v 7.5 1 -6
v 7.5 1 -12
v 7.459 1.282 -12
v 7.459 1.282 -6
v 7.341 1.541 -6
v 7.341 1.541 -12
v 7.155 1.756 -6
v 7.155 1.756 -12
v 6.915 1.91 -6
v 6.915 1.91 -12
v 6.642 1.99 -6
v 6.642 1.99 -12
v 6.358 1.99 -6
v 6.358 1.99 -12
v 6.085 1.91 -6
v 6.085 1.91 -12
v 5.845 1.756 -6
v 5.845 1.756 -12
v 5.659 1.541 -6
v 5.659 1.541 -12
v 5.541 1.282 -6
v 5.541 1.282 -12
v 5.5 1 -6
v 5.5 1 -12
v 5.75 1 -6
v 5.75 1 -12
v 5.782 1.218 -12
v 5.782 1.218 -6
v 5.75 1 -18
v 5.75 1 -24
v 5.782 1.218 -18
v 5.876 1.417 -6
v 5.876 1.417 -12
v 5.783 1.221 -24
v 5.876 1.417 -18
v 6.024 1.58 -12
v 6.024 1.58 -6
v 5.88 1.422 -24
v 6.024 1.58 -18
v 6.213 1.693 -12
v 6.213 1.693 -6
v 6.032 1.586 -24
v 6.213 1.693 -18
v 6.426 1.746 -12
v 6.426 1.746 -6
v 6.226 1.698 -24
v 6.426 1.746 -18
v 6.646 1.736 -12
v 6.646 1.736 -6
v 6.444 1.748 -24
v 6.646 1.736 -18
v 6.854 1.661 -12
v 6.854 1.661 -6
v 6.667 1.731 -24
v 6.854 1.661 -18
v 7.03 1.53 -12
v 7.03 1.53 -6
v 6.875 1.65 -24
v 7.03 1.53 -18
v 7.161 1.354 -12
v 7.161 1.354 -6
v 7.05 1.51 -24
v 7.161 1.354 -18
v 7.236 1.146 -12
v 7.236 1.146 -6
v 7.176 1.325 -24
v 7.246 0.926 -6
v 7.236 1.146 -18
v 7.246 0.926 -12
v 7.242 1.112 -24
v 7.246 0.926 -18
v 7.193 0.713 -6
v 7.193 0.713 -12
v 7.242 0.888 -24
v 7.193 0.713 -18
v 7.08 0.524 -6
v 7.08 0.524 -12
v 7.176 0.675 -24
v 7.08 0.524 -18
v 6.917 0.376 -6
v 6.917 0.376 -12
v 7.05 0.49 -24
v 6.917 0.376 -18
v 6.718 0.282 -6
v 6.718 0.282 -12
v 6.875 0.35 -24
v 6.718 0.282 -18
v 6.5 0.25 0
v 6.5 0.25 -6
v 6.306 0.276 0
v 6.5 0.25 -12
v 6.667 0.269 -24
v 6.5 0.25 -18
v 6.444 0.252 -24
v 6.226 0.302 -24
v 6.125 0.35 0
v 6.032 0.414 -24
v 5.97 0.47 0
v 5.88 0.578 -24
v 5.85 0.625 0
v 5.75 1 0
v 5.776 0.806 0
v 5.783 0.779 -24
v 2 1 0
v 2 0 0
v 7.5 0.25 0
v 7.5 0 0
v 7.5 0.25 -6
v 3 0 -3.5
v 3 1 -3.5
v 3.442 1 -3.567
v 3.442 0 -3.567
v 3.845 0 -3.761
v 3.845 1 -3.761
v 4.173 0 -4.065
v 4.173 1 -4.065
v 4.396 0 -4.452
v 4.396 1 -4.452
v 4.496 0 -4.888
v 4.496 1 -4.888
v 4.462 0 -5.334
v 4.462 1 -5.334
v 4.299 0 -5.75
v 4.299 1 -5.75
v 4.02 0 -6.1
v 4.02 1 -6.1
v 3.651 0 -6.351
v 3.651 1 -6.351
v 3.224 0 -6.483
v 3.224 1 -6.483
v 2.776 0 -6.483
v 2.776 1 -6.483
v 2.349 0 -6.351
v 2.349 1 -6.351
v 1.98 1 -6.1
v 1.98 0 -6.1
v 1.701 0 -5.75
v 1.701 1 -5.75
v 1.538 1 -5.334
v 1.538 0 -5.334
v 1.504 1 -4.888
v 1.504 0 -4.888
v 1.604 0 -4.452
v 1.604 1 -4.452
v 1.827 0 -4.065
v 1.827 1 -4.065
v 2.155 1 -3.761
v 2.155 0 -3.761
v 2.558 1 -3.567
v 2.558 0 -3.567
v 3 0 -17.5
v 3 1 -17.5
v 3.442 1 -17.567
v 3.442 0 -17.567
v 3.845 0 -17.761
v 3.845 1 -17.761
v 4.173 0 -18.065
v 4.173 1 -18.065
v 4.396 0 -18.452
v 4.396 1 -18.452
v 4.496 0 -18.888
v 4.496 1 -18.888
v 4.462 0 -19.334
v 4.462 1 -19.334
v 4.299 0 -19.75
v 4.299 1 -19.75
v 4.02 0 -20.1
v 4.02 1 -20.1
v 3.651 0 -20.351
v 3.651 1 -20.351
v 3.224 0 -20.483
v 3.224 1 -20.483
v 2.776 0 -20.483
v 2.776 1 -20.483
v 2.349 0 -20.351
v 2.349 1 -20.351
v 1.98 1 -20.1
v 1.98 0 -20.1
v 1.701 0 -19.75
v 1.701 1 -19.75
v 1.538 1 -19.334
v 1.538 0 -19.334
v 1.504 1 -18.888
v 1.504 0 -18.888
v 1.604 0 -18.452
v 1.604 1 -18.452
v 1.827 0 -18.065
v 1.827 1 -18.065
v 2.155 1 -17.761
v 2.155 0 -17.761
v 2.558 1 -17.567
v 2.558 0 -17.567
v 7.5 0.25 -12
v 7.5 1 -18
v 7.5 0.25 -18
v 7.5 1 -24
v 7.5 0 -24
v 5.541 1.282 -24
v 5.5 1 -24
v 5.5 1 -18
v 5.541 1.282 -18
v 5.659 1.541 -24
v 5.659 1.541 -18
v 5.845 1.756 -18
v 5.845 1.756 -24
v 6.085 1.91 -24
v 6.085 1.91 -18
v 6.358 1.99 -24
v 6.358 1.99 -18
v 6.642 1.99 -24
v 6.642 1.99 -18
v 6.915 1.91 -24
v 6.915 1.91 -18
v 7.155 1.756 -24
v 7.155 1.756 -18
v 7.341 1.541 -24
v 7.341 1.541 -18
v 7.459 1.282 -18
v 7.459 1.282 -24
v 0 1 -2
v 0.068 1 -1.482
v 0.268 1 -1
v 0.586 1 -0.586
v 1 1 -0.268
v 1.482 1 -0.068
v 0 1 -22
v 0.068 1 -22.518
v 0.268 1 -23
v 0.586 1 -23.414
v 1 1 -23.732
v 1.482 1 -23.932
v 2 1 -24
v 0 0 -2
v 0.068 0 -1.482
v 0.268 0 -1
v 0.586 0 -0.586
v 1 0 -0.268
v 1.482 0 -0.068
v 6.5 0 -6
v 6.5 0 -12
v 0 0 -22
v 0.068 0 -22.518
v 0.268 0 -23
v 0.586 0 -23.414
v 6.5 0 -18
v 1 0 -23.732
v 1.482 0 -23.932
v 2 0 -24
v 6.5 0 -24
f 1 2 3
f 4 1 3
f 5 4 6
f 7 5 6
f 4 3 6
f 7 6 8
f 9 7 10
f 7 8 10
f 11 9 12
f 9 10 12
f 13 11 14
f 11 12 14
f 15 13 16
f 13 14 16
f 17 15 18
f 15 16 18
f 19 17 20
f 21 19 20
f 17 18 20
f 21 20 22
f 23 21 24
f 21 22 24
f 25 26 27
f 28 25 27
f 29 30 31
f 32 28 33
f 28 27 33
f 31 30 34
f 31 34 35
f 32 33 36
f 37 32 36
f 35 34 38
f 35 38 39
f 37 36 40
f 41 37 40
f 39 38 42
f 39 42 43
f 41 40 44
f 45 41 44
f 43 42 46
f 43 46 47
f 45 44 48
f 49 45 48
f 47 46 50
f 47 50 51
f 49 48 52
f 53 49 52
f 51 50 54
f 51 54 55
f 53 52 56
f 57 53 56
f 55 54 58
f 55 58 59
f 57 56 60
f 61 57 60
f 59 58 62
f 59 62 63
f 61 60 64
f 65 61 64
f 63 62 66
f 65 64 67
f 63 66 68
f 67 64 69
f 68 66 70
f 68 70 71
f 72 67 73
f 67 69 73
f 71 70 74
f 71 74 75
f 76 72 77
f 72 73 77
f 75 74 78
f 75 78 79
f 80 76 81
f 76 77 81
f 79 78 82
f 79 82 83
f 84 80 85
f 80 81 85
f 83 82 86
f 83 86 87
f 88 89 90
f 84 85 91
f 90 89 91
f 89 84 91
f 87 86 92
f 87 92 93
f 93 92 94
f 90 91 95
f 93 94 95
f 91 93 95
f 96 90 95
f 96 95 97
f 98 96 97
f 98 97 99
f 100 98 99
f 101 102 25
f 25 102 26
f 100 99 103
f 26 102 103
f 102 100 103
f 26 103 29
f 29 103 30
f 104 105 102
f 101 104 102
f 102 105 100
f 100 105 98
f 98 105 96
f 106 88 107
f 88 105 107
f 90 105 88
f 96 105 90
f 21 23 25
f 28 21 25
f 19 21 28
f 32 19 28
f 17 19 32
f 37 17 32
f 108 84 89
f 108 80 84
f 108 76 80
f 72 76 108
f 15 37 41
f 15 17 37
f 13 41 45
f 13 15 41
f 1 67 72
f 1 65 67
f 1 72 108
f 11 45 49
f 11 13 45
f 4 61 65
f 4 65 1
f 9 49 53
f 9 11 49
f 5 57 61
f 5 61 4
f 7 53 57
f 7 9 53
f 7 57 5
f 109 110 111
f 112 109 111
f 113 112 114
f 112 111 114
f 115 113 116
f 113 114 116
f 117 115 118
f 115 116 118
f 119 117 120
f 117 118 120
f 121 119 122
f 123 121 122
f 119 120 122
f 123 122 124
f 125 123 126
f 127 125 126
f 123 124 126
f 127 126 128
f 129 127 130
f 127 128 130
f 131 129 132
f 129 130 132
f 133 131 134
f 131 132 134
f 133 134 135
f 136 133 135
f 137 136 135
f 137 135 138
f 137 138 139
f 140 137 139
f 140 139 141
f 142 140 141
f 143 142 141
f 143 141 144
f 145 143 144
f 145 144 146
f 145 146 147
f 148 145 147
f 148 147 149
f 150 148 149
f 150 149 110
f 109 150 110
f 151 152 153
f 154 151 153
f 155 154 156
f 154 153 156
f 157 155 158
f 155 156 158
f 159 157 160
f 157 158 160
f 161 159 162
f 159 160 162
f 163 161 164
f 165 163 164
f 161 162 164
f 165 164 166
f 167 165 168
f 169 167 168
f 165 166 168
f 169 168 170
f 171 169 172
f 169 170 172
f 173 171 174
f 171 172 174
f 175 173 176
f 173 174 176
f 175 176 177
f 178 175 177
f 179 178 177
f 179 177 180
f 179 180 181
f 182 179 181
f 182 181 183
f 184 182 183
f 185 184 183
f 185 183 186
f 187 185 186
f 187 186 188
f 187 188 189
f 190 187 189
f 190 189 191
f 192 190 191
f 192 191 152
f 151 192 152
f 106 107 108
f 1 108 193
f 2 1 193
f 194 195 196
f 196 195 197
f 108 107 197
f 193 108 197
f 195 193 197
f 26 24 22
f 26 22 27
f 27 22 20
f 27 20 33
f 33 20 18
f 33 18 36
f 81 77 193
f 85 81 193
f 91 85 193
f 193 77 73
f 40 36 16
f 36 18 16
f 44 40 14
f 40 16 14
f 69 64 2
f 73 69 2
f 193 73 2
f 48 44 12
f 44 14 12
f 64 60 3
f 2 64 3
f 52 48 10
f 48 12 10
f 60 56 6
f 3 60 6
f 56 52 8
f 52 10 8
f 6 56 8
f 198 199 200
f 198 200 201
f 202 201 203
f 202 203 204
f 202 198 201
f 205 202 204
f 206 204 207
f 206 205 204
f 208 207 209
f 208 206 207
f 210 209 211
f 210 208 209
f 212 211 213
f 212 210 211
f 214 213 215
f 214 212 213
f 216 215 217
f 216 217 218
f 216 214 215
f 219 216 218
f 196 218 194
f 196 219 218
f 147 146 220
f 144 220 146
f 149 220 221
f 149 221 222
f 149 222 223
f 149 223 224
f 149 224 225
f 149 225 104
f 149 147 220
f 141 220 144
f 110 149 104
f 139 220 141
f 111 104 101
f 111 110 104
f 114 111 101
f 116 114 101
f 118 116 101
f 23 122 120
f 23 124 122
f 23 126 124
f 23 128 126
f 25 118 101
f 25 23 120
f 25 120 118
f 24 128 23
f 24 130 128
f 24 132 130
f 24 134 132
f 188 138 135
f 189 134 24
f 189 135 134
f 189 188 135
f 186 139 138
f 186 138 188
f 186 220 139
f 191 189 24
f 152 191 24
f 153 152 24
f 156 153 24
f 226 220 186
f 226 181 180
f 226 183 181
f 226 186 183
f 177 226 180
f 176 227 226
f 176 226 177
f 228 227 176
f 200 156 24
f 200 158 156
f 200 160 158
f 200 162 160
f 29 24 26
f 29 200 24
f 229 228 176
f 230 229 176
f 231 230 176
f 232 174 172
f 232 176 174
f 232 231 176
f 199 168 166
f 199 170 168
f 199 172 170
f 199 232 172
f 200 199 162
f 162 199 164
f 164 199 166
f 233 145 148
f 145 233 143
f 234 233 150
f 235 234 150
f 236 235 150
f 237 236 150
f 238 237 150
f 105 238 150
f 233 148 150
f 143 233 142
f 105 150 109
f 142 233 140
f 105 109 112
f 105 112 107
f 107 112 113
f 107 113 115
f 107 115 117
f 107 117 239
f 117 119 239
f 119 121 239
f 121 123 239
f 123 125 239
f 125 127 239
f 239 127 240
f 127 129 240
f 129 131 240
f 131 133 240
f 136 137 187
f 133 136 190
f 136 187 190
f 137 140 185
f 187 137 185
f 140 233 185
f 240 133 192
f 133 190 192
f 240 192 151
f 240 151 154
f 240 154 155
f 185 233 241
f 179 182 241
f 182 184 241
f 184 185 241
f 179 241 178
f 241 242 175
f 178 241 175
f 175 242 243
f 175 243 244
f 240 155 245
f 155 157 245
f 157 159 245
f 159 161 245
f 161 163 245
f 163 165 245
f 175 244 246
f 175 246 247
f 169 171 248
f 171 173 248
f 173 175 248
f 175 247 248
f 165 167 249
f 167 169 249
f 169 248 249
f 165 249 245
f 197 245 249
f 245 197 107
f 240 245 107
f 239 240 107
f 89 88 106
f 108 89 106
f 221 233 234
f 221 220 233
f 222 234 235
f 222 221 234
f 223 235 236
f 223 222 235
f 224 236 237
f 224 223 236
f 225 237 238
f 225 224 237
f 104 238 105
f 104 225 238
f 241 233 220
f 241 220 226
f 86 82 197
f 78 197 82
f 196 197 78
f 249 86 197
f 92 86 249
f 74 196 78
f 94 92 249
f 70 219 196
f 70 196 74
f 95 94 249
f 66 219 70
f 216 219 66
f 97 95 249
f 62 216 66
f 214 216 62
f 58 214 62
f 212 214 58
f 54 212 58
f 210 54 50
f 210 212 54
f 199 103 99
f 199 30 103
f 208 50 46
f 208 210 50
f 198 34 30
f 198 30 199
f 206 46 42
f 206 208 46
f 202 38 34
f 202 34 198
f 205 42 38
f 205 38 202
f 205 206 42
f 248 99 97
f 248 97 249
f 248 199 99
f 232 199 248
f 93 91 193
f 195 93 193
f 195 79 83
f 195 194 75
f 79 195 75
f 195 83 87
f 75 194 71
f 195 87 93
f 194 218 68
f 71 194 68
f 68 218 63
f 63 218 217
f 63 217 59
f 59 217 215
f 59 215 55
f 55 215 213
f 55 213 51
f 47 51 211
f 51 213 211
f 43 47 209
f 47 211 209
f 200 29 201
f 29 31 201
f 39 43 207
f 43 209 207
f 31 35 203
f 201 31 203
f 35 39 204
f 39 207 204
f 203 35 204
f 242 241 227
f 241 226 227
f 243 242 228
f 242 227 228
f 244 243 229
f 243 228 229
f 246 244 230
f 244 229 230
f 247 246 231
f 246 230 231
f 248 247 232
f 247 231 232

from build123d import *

# Parameters (mm, degrees)
CROQUIS1_W              = 7.5
CROQUIS1_H              = 24
SALIENTE_EXTRUIR1_DEPTH = 1
CROQUIS2_R              = 1
SALIENTE_EXTRUIR2_DEPTH = 6
CROQUIS3_R              = 1
SALIENTE_EXTRUIR3_DEPTH = 6
CROQUIS4_R              = 0.75
CORTAR_EXTRUIR1_DEPTH   = 24
REDONDEO1_R             = 2
CROQUIS5_R              = 1.5
CORTAR_EXTRUIR2_DEPTH   = 18
CORTAR_EXTRUIR3_DEPTH   = 6
CORTAR_EXTRUIR4_DEPTH   = 6


with BuildPart() as part:
    # Croquis1 → Saliente-Extruir1 (new body)
    with BuildSketch(Plane(origin=(0, 0, 0), x_dir=(1, 0, 0), z_dir=(0, 1, 0))):
        with Locations((3.75, 12)):
            Rectangle(CROQUIS1_W, CROQUIS1_H)
    extrude(amount=SALIENTE_EXTRUIR1_DEPTH)

    # Croquis2 → Saliente-Extruir2 (add)
    with BuildSketch(Plane(origin=(0, 0, -24), x_dir=(-1, 0, 0), z_dir=(0, 0, -1))):
        with Locations((-6.5, 1)):
            Circle(CROQUIS2_R)
    extrude(amount=-SALIENTE_EXTRUIR2_DEPTH)

    # Croquis3 → Saliente-Extruir3 (add)
    with BuildSketch(Plane.XY.offset(-12)):
        with Locations((6.5, 1)):
            Circle(CROQUIS3_R)
    extrude(amount=SALIENTE_EXTRUIR3_DEPTH)

    # Croquis4 → Cortar-Extruir1 (cut)
    with BuildSketch(Plane(origin=(0, 0, -24), x_dir=(-1, 0, 0), z_dir=(0, 0, -1))):
        with Locations((-6.5, 1)):
            Circle(CROQUIS4_R)
    extrude(amount=-CORTAR_EXTRUIR1_DEPTH, mode=Mode.SUBTRACT)

    # Redondeo1
    redondeo1_edges = [part.edges().sort_by_distance(p)[0] for p in [
        (0, 0.5, -24),
        (0, 0.5, 0),
    ]]
    fillet(redondeo1_edges, radius=REDONDEO1_R)

    # Croquis5 → Cortar-Extruir2 (cut)
    with BuildSketch(Plane(origin=(0, 1, 0), x_dir=(1, 0, 0), z_dir=(0, 1, 0))):
        with Locations(Location((3, 19, 0), (0, 0, 270))):
            Circle(CROQUIS5_R)
        with Locations(Location((3, 5, 0), (0, 0, 270))):
            Circle(CROQUIS5_R)
    extrude(amount=-CORTAR_EXTRUIR2_DEPTH, mode=Mode.SUBTRACT)

    # Croquis6 → Cortar-Extruir3 (cut)
    with BuildSketch(Plane.XY):
        Polygon((6.5, 0.25), (7.5, 0.25), (7.5, 1), (7.25, 1), align=None)
    extrude(amount=-CORTAR_EXTRUIR3_DEPTH, mode=Mode.SUBTRACT)

    # Croquis7 → Cortar-Extruir4 (cut)
    with BuildSketch(Plane(origin=(0, 0, -12), x_dir=(-1, 0, 0), z_dir=(0, 0, -1))):
        Polygon((-6.5, 0.25), (-7.5, 0.25), (-7.5, 1), (-6.800248099, 1), align=None)
    extrude(amount=CORTAR_EXTRUIR4_DEPTH, mode=Mode.SUBTRACT)


solid = part.part
